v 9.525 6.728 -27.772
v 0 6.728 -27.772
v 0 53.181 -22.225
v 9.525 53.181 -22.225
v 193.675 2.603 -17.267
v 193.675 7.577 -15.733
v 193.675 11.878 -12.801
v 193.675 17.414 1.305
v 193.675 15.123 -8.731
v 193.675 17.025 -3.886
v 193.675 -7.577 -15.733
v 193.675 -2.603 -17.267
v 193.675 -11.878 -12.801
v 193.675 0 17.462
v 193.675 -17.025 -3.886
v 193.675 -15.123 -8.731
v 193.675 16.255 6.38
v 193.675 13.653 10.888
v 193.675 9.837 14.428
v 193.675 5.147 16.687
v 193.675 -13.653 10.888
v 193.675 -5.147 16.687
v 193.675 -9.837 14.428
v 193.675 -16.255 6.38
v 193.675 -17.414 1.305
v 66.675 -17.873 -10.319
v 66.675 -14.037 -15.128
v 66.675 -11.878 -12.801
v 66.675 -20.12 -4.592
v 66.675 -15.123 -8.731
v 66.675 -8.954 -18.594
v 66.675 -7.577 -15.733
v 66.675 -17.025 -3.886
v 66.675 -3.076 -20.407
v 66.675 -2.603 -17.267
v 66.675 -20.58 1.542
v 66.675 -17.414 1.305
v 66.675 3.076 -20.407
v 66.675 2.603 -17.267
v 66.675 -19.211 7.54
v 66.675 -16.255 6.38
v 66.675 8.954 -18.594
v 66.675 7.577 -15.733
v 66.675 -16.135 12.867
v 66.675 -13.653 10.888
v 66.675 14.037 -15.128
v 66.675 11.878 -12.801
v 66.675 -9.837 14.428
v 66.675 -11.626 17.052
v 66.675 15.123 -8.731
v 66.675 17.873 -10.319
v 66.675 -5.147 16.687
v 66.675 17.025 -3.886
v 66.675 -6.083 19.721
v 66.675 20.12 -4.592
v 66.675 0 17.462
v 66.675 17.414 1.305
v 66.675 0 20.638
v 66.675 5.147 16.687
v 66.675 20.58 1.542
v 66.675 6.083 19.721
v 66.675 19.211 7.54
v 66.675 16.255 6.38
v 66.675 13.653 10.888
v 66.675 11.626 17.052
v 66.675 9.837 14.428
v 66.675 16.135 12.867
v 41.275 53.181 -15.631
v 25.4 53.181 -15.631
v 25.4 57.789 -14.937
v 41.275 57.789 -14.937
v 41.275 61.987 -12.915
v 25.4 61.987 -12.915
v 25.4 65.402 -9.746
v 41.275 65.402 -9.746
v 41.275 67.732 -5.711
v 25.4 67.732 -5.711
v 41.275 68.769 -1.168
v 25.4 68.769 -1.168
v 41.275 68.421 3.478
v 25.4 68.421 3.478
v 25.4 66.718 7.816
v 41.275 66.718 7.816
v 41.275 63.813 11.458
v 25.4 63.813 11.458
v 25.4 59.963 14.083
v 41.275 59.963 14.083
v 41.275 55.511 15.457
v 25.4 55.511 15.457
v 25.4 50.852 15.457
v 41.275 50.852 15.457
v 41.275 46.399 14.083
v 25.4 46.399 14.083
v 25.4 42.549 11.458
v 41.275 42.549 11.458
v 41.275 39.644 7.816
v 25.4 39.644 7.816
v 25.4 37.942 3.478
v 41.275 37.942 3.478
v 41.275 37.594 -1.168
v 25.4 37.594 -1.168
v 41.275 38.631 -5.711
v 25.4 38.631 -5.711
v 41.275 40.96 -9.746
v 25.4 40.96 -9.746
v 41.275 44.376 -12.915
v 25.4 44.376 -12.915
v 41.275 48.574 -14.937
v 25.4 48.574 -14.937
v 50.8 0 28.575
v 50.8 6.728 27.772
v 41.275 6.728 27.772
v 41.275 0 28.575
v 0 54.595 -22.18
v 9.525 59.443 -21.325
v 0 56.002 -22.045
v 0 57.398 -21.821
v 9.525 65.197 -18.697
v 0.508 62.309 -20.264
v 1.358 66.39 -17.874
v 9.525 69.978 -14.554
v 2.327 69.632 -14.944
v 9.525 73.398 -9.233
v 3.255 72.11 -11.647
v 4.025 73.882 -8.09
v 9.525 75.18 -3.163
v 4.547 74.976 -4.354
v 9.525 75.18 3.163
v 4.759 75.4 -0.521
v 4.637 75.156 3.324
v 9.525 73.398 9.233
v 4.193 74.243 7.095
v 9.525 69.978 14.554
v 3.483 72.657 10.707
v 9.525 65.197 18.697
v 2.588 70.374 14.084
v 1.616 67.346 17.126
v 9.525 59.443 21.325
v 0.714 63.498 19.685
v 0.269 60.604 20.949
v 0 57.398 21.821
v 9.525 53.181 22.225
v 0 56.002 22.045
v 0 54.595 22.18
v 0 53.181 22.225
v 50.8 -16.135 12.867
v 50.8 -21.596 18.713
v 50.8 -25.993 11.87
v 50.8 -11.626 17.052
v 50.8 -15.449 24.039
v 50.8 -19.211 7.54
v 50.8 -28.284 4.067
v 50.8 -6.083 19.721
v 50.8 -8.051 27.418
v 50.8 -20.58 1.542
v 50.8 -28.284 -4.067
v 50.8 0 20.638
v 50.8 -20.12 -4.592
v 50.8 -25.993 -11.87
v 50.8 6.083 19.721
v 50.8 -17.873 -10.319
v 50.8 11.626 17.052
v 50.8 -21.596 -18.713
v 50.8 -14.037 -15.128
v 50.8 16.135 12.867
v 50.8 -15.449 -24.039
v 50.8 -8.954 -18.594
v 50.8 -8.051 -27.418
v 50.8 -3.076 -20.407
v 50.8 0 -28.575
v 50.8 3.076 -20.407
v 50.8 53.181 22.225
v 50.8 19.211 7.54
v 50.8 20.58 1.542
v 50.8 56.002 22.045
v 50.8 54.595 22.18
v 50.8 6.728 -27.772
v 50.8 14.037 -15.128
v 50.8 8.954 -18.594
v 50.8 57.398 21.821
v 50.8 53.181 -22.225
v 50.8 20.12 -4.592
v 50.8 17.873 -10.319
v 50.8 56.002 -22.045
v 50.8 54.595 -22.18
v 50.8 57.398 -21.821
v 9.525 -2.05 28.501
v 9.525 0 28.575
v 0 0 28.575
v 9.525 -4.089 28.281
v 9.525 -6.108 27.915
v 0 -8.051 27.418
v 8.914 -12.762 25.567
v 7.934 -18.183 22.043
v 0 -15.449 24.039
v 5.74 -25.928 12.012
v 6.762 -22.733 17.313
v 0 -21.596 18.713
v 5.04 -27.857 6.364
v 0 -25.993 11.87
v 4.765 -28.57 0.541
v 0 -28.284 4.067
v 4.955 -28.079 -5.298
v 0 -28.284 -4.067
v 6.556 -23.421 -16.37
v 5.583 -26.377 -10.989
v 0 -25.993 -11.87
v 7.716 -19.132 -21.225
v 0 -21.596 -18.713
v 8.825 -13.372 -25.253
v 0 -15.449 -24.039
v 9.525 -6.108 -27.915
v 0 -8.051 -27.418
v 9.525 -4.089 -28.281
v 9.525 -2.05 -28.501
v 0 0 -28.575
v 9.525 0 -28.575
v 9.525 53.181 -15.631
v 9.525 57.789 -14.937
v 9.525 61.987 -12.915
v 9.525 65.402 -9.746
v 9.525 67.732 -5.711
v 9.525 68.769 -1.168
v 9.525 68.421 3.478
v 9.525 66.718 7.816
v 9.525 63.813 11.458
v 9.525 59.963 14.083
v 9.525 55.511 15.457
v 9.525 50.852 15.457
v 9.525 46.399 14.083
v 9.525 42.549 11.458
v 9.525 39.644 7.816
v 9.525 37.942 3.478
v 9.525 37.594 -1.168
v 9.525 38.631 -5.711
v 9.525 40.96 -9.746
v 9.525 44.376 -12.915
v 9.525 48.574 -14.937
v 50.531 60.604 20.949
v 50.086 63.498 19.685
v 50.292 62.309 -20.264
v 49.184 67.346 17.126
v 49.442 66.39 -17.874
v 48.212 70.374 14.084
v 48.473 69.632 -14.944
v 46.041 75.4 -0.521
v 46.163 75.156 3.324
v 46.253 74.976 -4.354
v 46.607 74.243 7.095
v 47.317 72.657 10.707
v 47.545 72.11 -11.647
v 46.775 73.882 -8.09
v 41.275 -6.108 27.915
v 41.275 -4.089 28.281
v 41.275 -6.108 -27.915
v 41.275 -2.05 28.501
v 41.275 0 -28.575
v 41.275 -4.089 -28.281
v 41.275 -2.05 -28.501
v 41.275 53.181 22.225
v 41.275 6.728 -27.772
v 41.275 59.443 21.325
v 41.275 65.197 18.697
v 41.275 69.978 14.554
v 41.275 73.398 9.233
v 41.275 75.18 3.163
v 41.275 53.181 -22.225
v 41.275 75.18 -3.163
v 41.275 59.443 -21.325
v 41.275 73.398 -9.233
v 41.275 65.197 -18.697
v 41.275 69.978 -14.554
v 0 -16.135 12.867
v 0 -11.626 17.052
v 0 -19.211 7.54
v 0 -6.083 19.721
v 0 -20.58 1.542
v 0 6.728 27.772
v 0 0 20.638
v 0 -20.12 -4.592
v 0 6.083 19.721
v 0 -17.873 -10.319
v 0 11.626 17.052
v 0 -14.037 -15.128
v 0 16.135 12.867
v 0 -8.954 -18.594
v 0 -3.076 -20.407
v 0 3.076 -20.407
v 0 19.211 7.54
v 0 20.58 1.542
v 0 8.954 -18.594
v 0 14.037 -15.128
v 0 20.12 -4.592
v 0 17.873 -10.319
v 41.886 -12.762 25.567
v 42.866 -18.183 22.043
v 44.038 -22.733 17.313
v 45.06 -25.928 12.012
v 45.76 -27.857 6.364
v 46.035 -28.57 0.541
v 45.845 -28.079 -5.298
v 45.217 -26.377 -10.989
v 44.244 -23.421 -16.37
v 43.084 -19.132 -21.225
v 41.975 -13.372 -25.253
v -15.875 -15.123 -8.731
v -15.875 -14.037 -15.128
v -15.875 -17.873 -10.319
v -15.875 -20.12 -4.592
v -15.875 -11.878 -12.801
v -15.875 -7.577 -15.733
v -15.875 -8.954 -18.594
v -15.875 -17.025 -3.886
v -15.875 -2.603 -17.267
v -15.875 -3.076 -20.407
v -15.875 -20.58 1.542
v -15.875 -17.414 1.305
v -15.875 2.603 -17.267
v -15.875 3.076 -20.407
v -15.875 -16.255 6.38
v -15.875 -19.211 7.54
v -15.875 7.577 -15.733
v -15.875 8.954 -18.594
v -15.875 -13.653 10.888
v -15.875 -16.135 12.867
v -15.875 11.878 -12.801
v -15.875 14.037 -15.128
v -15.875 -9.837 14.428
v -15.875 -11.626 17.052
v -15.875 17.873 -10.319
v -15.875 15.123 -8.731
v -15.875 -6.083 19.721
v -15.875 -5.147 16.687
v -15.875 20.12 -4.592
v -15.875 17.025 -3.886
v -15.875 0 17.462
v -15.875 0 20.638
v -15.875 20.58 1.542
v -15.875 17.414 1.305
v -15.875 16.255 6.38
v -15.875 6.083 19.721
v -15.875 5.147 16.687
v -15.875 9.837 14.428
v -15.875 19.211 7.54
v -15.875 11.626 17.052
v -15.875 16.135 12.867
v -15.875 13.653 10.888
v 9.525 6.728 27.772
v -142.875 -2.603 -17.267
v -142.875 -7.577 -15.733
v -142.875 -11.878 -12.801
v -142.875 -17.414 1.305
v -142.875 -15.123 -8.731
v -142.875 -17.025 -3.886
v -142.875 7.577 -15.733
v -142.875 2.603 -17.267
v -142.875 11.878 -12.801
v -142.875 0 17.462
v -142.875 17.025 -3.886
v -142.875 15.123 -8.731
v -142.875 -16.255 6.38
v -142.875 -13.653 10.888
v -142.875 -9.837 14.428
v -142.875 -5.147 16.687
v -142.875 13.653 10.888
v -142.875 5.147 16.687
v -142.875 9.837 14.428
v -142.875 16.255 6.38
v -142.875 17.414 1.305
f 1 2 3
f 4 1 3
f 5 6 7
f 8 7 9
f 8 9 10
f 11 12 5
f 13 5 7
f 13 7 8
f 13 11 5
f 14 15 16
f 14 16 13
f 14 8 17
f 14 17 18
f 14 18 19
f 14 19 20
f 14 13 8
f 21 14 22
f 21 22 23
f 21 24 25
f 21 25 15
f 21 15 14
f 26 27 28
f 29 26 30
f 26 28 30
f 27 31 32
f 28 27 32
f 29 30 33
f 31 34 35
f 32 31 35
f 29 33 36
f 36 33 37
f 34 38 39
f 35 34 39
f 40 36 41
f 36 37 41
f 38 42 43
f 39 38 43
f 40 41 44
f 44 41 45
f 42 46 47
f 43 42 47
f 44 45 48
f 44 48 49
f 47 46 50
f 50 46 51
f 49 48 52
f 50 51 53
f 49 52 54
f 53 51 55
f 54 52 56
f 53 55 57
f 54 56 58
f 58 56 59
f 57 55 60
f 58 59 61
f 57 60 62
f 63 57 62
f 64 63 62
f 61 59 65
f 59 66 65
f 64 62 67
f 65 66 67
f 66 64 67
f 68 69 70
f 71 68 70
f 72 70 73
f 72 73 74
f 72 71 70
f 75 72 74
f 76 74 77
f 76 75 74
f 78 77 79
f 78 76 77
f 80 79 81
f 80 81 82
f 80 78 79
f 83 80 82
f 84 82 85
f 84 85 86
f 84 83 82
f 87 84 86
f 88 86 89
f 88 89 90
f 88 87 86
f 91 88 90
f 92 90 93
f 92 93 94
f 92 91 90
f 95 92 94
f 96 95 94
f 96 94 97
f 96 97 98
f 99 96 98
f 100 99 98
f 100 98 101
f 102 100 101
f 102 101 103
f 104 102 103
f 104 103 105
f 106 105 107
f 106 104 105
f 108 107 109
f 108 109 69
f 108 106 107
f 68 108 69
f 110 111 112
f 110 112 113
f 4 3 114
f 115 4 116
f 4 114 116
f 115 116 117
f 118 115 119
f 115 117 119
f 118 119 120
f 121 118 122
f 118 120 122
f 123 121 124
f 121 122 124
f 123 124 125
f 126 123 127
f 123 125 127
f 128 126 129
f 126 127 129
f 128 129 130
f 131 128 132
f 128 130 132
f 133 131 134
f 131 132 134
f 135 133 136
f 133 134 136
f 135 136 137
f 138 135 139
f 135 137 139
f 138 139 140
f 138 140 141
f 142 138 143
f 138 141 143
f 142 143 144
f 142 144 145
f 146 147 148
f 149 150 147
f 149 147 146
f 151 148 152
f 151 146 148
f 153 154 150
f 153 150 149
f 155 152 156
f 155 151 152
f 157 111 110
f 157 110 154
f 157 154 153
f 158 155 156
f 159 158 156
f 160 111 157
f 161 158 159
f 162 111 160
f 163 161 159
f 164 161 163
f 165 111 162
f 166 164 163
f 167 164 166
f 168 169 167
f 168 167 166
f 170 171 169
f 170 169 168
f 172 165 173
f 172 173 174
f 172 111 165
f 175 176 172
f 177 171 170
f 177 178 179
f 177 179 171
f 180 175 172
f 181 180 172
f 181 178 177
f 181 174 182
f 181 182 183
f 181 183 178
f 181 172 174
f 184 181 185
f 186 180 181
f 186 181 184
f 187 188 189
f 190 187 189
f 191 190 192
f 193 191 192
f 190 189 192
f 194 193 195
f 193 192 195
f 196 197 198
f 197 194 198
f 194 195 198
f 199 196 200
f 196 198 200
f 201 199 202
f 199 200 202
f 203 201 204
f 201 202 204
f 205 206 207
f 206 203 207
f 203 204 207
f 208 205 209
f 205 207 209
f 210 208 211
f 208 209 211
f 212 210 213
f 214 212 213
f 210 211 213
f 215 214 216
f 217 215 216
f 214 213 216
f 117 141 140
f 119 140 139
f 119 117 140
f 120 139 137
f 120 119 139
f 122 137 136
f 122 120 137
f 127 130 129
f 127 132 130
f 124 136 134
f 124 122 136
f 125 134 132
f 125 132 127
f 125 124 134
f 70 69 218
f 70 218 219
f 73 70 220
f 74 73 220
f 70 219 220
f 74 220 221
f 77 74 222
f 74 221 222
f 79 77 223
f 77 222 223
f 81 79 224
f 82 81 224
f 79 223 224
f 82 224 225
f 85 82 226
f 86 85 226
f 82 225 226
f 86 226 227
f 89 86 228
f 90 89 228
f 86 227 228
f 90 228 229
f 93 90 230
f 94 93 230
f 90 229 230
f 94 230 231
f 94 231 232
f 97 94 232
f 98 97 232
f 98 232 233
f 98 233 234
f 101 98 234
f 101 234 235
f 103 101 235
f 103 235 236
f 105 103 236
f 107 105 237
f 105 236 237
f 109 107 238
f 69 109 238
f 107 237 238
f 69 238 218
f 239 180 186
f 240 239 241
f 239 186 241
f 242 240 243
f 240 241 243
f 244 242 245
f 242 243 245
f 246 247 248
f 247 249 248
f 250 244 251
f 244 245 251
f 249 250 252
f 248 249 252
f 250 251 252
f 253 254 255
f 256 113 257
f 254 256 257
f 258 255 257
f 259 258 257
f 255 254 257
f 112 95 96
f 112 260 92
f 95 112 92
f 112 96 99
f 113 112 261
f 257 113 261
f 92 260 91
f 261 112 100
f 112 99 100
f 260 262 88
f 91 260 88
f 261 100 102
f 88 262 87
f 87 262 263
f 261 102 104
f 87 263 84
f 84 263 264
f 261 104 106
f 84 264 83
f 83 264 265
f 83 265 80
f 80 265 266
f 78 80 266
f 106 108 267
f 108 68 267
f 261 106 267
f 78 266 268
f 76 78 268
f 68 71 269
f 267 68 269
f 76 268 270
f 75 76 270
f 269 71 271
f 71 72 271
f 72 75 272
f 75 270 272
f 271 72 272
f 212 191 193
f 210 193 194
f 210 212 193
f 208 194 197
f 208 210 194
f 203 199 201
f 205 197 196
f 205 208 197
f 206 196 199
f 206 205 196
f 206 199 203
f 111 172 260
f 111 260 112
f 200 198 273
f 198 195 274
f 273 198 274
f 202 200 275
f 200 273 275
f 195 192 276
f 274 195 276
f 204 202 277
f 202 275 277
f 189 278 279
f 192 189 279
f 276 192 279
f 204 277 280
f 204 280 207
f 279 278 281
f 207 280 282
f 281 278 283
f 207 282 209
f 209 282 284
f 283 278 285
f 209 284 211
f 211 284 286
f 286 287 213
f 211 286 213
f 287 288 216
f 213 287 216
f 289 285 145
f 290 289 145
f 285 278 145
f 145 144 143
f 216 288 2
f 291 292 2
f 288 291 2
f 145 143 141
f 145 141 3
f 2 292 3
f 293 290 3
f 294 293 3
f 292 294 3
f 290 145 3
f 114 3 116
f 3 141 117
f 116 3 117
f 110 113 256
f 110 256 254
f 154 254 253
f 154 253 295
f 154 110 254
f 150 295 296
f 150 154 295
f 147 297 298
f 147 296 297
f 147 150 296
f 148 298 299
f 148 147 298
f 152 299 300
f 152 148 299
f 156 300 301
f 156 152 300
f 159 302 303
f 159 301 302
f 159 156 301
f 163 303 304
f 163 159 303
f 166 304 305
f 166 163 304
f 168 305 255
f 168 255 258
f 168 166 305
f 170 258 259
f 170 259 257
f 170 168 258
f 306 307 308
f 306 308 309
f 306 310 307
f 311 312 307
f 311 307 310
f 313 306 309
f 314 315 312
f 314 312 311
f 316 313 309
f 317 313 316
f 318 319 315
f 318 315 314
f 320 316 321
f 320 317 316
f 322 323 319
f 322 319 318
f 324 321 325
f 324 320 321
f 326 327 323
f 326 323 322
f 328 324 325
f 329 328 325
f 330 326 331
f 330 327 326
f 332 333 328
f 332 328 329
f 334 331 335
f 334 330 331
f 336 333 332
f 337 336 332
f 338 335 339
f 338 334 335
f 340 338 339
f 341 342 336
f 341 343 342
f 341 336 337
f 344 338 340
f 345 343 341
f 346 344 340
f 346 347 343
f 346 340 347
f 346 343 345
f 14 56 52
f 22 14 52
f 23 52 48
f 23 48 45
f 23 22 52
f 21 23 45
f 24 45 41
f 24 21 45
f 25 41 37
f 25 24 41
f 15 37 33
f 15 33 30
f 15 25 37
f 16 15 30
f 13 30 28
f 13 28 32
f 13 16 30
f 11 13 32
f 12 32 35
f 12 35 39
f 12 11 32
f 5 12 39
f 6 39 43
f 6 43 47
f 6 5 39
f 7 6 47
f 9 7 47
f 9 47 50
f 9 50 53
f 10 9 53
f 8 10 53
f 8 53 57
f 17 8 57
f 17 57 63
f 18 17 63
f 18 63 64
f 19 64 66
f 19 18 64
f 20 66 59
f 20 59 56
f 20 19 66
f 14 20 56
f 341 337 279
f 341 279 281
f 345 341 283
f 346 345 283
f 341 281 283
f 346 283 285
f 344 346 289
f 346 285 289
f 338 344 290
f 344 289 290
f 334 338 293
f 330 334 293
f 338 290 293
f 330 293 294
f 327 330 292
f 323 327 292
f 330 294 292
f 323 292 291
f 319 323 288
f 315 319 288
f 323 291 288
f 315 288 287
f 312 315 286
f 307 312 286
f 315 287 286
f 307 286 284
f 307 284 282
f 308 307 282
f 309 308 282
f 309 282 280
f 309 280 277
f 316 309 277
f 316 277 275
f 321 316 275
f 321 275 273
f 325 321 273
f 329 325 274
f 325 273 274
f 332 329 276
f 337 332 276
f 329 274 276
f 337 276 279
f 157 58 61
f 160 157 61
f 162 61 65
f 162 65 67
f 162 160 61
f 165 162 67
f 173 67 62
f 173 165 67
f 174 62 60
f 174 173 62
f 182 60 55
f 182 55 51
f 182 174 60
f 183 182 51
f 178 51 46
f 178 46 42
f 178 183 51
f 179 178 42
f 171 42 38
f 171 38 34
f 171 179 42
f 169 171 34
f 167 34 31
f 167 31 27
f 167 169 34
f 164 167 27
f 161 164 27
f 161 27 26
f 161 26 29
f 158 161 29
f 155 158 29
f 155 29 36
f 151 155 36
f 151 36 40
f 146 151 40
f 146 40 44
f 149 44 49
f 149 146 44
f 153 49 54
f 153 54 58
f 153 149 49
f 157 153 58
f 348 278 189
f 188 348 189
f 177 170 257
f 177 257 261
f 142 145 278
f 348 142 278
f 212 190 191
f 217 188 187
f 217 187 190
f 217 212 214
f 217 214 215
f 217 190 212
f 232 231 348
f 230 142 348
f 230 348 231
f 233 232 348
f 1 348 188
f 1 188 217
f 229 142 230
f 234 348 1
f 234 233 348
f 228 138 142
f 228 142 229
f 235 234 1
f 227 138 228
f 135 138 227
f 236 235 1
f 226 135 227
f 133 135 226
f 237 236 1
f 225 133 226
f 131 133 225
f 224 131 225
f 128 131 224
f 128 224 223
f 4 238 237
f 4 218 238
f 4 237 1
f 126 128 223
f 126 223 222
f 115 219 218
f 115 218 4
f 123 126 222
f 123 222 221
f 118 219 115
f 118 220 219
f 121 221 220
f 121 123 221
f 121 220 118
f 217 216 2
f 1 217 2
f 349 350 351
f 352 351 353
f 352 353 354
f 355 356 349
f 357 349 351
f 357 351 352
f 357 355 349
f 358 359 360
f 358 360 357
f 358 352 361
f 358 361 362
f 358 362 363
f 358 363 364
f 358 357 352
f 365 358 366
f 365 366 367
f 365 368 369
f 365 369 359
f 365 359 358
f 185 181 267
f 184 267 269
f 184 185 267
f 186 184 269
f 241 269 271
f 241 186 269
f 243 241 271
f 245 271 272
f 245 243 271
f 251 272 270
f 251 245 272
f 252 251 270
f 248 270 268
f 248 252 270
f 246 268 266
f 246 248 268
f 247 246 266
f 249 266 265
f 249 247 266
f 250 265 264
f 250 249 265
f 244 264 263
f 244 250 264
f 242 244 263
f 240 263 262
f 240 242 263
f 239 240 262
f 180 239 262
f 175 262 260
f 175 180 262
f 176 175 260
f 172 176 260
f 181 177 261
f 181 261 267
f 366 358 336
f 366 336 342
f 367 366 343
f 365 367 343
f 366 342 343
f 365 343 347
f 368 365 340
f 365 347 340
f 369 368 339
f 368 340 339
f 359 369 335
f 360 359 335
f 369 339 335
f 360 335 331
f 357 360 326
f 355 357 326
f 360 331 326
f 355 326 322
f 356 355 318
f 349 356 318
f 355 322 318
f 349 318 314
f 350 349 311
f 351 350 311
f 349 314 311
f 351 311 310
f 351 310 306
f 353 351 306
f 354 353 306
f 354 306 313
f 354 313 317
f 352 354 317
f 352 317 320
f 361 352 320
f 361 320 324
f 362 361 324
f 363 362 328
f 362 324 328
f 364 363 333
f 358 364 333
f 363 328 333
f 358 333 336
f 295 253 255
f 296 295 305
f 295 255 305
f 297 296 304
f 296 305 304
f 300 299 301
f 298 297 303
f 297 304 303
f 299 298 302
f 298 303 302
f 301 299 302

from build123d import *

# Parameters (mm, degrees)
SKETCH1_R               = 20.6375
BOSS_EXTRUDE1_DEPTH     = 9.525
SKETCH2_R               = 20.6375
BOSS_EXTRUDE3_DEPTH     = 15.875
SKETCH3_R               = 15.631220112
BOSS_EXTRUDE4_DEPTH     = 15.875
CUT_EXTRUDE1_DEPTH      = 85.544622325
CUT_EXTRUDE1_DEPTH_BACK = 85.544622325
CUT_EXTRUDE2_DEPTH      = 85.544622414
CUT_EXTRUDE2_DEPTH_BACK = 85.544622414
SKETCH6_R               = 17.4625
BOSS_EXTRUDE5_DEPTH     = 127
BOSS_EXTRUDE6_START     = 127
SKETCH7_R               = 17.4625
BOSS_EXTRUDE6_DEPTH     = 127


with BuildPart() as part:
    # Sketch1 → Boss-Extrude1 (new body)
    # profile 1 of 2: a face of its own
    with BuildSketch(Plane(origin=(0, 0, 0), x_dir=(0, 0, -1), z_dir=(1, 0, 0))):
        with BuildLine():
            ThreePointArc((22.225, 53.18125), (0, 75.40625), (-22.225, 53.18125))
            Line((-22.225, 53.18125), (-27.771661542, 6.727959587))
            Line((-27.771661542, 6.727959587), (-28.575, 0))
            ThreePointArc((-28.575, 0), (0, -28.575), (28.575, 0))
            Line((28.575, 0), (27.771661542, 6.727959587))
            Line((27.771661542, 6.727959587), (22.225, 53.18125))
        make_face()
        Circle(SKETCH1_R, mode=Mode.SUBTRACT)
    # profile 2 of 2: a face of its own
    with BuildSketch(Plane(origin=(0, 0, 0), x_dir=(0, 0, -1), z_dir=(1, 0, 0))):
        Circle(SKETCH1_R)
    extrude(amount=BOSS_EXTRUDE1_DEPTH)

    # Sketch2 → Boss-Extrude3 (add)
    with BuildSketch(Plane.ZY):
        Circle(SKETCH2_R)
    extrude(amount=BOSS_EXTRUDE3_DEPTH)

    # Sketch3 → Boss-Extrude4 (add)
    with BuildSketch(Plane(origin=(9.525, 0, 0), x_dir=(0, 0, -1), z_dir=(1, 0, 0))):
        with Locations((0, 53.18125)):
            Circle(SKETCH3_R)
    extrude(amount=BOSS_EXTRUDE4_DEPTH)

    # Sketch4 → Cut-Extrude1 (cut, two sides: drawn at the far end of the back side and taken through both)
    with BuildSketch(Plane.XY.offset(-CUT_EXTRUDE1_DEPTH_BACK)):
        with BuildLine():
            Line((4.7625, 75.40625), (-6.178104272, 75.40625))
            Line((-6.178104272, 75.40625), (-6.178104272, 53.18125))
            Line((-6.178104272, 53.18125), (0, 53.18125))
            ThreePointArc((0, 53.18125), (0.936646322, 64.603307931), (4.7625, 75.40625))
        make_face()
    extrude(amount=CUT_EXTRUDE1_DEPTH + CUT_EXTRUDE1_DEPTH_BACK, mode=Mode.SUBTRACT)

    # Sketch5 → Cut-Extrude2 (cut, two sides: drawn at the far end of the back side and taken through both)
    with BuildSketch(Plane.XY.offset(-CUT_EXTRUDE2_DEPTH_BACK)):
        with BuildLine():
            Line((4.7625, -28.575), (17.4625, -28.575))
            Line((17.4625, -28.575), (17.4625, 0))
            Line((17.4625, 0), (9.525, 0))
            ThreePointArc((9.525, 0), (8.641404401, -14.537109067), (4.7625, -28.575))
        make_face()
    extrude(amount=CUT_EXTRUDE2_DEPTH + CUT_EXTRUDE2_DEPTH_BACK, mode=Mode.SUBTRACT)

    # Mirror1: part across plane


with BuildPart() as part_1:
    add(part.part)
    add(part.part.mirror(Plane(origin=(25.4, 53.18125, 0), x_dir=(0, 0, 1), z_dir=(1, 0, 0))))

    # Sketch6 → Boss-Extrude5 (add)
    with BuildSketch(Plane.ZY.offset(15.875)):
        Circle(SKETCH6_R)
    extrude(amount=BOSS_EXTRUDE5_DEPTH)

    # Sketch7 → Boss-Extrude6 (add)
    with BuildSketch(Plane(origin=(66.675, 0, 0), x_dir=(0, 0, -1), z_dir=(1, 0, 0)).offset(BOSS_EXTRUDE6_START)):
        with Locations(Location((0, 0, 0), (0, 0, 180))):
            Circle(SKETCH7_R)
    extrude(amount=-BOSS_EXTRUDE6_DEPTH)


solid = part_1.part
